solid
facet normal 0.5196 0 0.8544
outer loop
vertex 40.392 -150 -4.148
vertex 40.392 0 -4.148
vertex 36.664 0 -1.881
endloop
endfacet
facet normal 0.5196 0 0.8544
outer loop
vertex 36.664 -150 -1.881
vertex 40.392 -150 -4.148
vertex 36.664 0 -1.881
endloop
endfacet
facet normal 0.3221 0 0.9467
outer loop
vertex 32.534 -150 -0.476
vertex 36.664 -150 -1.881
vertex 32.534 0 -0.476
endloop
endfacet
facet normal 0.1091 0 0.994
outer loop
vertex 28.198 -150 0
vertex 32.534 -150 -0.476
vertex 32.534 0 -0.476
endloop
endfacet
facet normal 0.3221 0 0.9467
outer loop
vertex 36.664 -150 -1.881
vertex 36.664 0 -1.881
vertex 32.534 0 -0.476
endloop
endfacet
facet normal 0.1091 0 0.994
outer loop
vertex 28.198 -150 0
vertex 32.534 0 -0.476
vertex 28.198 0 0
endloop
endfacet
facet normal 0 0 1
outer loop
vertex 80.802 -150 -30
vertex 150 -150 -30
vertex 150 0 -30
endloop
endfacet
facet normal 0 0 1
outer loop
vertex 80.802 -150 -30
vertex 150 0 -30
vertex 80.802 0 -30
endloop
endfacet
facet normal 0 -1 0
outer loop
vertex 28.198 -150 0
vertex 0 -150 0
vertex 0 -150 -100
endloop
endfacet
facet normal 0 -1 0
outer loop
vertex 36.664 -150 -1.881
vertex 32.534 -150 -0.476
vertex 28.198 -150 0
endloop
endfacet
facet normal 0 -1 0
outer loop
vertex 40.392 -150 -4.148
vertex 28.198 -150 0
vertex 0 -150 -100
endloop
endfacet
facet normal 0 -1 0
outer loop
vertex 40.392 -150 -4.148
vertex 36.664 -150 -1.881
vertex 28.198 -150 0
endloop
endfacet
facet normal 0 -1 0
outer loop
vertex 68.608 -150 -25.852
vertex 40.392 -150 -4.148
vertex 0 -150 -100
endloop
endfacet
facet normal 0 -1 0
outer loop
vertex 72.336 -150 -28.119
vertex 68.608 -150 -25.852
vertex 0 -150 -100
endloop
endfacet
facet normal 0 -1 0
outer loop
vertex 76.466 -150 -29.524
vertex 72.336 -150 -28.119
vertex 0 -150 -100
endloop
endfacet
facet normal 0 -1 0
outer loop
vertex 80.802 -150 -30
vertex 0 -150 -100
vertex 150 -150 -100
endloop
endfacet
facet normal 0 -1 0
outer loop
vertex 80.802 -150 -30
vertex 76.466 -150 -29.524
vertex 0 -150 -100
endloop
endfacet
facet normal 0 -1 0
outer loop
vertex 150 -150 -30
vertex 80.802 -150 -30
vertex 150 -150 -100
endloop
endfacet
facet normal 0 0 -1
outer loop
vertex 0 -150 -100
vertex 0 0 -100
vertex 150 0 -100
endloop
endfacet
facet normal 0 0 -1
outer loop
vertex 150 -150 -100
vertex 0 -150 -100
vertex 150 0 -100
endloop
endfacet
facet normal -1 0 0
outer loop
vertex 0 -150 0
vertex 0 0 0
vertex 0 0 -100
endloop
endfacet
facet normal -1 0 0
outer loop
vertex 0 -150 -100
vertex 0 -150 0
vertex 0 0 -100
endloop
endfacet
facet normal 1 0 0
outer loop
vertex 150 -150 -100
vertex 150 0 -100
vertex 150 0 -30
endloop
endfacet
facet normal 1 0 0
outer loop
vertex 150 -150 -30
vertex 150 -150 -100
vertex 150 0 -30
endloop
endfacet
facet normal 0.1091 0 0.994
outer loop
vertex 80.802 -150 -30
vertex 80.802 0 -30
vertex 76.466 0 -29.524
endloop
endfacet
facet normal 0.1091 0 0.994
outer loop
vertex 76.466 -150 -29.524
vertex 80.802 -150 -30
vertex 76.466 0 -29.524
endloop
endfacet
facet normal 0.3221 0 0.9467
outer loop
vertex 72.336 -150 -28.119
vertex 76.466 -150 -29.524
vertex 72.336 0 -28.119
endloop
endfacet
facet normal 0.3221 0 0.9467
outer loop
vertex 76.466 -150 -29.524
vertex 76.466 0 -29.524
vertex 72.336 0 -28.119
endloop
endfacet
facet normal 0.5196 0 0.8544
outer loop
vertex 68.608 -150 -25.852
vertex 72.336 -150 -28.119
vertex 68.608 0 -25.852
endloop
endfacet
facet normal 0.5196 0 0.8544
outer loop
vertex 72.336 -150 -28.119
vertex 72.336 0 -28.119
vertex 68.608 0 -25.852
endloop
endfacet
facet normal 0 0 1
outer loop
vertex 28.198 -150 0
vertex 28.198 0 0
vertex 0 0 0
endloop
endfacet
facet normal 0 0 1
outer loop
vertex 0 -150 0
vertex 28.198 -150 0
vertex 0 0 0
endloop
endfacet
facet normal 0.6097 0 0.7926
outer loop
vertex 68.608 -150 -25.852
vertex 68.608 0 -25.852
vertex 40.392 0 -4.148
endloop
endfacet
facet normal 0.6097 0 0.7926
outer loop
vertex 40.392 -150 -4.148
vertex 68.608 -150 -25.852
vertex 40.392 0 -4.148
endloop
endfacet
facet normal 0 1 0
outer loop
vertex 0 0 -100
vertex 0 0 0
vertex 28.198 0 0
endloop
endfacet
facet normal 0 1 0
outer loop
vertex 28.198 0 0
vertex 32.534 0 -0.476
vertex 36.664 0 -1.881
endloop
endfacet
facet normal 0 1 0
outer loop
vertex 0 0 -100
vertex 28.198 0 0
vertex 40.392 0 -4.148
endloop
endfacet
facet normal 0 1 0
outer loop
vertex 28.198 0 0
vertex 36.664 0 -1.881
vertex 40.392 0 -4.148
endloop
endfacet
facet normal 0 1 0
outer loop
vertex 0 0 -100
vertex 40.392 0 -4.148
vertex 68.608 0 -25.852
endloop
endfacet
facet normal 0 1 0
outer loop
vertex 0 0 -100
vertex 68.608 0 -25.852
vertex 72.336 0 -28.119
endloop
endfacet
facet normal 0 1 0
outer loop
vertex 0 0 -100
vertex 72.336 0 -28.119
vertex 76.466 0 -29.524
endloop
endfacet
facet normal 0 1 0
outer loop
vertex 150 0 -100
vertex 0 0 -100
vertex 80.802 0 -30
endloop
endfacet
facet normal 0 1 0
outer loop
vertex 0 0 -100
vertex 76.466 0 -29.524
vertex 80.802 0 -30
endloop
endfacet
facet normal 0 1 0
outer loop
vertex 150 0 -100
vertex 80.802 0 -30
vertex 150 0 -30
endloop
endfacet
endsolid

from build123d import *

# Parameters (mm, degrees)
F1_DEPTH = 150


with BuildPart() as f1:
    # F0 (on Front) → F1 (new body)
    with BuildSketch(Plane.XZ):
        with BuildLine():
            Line((28.197561, 0), (0, 0))
            Line((0, 0), (0, -100))
            Line((0, -100), (150, -100))
            Line((150, -100), (150, -30))
            Line((150, -30), (80.802439, -30))
            ThreePointArc((80.802439, -30), (74.362315, -28.934751), (68.608224, -25.85248))
            Line((68.608224, -25.85248), (40.391776, -4.14752))
            ThreePointArc((40.391776, -4.14752), (34.637685, -1.065249), (28.197561, 0))
        make_face()
    extrude(amount=F1_DEPTH)


solid = f1.part
